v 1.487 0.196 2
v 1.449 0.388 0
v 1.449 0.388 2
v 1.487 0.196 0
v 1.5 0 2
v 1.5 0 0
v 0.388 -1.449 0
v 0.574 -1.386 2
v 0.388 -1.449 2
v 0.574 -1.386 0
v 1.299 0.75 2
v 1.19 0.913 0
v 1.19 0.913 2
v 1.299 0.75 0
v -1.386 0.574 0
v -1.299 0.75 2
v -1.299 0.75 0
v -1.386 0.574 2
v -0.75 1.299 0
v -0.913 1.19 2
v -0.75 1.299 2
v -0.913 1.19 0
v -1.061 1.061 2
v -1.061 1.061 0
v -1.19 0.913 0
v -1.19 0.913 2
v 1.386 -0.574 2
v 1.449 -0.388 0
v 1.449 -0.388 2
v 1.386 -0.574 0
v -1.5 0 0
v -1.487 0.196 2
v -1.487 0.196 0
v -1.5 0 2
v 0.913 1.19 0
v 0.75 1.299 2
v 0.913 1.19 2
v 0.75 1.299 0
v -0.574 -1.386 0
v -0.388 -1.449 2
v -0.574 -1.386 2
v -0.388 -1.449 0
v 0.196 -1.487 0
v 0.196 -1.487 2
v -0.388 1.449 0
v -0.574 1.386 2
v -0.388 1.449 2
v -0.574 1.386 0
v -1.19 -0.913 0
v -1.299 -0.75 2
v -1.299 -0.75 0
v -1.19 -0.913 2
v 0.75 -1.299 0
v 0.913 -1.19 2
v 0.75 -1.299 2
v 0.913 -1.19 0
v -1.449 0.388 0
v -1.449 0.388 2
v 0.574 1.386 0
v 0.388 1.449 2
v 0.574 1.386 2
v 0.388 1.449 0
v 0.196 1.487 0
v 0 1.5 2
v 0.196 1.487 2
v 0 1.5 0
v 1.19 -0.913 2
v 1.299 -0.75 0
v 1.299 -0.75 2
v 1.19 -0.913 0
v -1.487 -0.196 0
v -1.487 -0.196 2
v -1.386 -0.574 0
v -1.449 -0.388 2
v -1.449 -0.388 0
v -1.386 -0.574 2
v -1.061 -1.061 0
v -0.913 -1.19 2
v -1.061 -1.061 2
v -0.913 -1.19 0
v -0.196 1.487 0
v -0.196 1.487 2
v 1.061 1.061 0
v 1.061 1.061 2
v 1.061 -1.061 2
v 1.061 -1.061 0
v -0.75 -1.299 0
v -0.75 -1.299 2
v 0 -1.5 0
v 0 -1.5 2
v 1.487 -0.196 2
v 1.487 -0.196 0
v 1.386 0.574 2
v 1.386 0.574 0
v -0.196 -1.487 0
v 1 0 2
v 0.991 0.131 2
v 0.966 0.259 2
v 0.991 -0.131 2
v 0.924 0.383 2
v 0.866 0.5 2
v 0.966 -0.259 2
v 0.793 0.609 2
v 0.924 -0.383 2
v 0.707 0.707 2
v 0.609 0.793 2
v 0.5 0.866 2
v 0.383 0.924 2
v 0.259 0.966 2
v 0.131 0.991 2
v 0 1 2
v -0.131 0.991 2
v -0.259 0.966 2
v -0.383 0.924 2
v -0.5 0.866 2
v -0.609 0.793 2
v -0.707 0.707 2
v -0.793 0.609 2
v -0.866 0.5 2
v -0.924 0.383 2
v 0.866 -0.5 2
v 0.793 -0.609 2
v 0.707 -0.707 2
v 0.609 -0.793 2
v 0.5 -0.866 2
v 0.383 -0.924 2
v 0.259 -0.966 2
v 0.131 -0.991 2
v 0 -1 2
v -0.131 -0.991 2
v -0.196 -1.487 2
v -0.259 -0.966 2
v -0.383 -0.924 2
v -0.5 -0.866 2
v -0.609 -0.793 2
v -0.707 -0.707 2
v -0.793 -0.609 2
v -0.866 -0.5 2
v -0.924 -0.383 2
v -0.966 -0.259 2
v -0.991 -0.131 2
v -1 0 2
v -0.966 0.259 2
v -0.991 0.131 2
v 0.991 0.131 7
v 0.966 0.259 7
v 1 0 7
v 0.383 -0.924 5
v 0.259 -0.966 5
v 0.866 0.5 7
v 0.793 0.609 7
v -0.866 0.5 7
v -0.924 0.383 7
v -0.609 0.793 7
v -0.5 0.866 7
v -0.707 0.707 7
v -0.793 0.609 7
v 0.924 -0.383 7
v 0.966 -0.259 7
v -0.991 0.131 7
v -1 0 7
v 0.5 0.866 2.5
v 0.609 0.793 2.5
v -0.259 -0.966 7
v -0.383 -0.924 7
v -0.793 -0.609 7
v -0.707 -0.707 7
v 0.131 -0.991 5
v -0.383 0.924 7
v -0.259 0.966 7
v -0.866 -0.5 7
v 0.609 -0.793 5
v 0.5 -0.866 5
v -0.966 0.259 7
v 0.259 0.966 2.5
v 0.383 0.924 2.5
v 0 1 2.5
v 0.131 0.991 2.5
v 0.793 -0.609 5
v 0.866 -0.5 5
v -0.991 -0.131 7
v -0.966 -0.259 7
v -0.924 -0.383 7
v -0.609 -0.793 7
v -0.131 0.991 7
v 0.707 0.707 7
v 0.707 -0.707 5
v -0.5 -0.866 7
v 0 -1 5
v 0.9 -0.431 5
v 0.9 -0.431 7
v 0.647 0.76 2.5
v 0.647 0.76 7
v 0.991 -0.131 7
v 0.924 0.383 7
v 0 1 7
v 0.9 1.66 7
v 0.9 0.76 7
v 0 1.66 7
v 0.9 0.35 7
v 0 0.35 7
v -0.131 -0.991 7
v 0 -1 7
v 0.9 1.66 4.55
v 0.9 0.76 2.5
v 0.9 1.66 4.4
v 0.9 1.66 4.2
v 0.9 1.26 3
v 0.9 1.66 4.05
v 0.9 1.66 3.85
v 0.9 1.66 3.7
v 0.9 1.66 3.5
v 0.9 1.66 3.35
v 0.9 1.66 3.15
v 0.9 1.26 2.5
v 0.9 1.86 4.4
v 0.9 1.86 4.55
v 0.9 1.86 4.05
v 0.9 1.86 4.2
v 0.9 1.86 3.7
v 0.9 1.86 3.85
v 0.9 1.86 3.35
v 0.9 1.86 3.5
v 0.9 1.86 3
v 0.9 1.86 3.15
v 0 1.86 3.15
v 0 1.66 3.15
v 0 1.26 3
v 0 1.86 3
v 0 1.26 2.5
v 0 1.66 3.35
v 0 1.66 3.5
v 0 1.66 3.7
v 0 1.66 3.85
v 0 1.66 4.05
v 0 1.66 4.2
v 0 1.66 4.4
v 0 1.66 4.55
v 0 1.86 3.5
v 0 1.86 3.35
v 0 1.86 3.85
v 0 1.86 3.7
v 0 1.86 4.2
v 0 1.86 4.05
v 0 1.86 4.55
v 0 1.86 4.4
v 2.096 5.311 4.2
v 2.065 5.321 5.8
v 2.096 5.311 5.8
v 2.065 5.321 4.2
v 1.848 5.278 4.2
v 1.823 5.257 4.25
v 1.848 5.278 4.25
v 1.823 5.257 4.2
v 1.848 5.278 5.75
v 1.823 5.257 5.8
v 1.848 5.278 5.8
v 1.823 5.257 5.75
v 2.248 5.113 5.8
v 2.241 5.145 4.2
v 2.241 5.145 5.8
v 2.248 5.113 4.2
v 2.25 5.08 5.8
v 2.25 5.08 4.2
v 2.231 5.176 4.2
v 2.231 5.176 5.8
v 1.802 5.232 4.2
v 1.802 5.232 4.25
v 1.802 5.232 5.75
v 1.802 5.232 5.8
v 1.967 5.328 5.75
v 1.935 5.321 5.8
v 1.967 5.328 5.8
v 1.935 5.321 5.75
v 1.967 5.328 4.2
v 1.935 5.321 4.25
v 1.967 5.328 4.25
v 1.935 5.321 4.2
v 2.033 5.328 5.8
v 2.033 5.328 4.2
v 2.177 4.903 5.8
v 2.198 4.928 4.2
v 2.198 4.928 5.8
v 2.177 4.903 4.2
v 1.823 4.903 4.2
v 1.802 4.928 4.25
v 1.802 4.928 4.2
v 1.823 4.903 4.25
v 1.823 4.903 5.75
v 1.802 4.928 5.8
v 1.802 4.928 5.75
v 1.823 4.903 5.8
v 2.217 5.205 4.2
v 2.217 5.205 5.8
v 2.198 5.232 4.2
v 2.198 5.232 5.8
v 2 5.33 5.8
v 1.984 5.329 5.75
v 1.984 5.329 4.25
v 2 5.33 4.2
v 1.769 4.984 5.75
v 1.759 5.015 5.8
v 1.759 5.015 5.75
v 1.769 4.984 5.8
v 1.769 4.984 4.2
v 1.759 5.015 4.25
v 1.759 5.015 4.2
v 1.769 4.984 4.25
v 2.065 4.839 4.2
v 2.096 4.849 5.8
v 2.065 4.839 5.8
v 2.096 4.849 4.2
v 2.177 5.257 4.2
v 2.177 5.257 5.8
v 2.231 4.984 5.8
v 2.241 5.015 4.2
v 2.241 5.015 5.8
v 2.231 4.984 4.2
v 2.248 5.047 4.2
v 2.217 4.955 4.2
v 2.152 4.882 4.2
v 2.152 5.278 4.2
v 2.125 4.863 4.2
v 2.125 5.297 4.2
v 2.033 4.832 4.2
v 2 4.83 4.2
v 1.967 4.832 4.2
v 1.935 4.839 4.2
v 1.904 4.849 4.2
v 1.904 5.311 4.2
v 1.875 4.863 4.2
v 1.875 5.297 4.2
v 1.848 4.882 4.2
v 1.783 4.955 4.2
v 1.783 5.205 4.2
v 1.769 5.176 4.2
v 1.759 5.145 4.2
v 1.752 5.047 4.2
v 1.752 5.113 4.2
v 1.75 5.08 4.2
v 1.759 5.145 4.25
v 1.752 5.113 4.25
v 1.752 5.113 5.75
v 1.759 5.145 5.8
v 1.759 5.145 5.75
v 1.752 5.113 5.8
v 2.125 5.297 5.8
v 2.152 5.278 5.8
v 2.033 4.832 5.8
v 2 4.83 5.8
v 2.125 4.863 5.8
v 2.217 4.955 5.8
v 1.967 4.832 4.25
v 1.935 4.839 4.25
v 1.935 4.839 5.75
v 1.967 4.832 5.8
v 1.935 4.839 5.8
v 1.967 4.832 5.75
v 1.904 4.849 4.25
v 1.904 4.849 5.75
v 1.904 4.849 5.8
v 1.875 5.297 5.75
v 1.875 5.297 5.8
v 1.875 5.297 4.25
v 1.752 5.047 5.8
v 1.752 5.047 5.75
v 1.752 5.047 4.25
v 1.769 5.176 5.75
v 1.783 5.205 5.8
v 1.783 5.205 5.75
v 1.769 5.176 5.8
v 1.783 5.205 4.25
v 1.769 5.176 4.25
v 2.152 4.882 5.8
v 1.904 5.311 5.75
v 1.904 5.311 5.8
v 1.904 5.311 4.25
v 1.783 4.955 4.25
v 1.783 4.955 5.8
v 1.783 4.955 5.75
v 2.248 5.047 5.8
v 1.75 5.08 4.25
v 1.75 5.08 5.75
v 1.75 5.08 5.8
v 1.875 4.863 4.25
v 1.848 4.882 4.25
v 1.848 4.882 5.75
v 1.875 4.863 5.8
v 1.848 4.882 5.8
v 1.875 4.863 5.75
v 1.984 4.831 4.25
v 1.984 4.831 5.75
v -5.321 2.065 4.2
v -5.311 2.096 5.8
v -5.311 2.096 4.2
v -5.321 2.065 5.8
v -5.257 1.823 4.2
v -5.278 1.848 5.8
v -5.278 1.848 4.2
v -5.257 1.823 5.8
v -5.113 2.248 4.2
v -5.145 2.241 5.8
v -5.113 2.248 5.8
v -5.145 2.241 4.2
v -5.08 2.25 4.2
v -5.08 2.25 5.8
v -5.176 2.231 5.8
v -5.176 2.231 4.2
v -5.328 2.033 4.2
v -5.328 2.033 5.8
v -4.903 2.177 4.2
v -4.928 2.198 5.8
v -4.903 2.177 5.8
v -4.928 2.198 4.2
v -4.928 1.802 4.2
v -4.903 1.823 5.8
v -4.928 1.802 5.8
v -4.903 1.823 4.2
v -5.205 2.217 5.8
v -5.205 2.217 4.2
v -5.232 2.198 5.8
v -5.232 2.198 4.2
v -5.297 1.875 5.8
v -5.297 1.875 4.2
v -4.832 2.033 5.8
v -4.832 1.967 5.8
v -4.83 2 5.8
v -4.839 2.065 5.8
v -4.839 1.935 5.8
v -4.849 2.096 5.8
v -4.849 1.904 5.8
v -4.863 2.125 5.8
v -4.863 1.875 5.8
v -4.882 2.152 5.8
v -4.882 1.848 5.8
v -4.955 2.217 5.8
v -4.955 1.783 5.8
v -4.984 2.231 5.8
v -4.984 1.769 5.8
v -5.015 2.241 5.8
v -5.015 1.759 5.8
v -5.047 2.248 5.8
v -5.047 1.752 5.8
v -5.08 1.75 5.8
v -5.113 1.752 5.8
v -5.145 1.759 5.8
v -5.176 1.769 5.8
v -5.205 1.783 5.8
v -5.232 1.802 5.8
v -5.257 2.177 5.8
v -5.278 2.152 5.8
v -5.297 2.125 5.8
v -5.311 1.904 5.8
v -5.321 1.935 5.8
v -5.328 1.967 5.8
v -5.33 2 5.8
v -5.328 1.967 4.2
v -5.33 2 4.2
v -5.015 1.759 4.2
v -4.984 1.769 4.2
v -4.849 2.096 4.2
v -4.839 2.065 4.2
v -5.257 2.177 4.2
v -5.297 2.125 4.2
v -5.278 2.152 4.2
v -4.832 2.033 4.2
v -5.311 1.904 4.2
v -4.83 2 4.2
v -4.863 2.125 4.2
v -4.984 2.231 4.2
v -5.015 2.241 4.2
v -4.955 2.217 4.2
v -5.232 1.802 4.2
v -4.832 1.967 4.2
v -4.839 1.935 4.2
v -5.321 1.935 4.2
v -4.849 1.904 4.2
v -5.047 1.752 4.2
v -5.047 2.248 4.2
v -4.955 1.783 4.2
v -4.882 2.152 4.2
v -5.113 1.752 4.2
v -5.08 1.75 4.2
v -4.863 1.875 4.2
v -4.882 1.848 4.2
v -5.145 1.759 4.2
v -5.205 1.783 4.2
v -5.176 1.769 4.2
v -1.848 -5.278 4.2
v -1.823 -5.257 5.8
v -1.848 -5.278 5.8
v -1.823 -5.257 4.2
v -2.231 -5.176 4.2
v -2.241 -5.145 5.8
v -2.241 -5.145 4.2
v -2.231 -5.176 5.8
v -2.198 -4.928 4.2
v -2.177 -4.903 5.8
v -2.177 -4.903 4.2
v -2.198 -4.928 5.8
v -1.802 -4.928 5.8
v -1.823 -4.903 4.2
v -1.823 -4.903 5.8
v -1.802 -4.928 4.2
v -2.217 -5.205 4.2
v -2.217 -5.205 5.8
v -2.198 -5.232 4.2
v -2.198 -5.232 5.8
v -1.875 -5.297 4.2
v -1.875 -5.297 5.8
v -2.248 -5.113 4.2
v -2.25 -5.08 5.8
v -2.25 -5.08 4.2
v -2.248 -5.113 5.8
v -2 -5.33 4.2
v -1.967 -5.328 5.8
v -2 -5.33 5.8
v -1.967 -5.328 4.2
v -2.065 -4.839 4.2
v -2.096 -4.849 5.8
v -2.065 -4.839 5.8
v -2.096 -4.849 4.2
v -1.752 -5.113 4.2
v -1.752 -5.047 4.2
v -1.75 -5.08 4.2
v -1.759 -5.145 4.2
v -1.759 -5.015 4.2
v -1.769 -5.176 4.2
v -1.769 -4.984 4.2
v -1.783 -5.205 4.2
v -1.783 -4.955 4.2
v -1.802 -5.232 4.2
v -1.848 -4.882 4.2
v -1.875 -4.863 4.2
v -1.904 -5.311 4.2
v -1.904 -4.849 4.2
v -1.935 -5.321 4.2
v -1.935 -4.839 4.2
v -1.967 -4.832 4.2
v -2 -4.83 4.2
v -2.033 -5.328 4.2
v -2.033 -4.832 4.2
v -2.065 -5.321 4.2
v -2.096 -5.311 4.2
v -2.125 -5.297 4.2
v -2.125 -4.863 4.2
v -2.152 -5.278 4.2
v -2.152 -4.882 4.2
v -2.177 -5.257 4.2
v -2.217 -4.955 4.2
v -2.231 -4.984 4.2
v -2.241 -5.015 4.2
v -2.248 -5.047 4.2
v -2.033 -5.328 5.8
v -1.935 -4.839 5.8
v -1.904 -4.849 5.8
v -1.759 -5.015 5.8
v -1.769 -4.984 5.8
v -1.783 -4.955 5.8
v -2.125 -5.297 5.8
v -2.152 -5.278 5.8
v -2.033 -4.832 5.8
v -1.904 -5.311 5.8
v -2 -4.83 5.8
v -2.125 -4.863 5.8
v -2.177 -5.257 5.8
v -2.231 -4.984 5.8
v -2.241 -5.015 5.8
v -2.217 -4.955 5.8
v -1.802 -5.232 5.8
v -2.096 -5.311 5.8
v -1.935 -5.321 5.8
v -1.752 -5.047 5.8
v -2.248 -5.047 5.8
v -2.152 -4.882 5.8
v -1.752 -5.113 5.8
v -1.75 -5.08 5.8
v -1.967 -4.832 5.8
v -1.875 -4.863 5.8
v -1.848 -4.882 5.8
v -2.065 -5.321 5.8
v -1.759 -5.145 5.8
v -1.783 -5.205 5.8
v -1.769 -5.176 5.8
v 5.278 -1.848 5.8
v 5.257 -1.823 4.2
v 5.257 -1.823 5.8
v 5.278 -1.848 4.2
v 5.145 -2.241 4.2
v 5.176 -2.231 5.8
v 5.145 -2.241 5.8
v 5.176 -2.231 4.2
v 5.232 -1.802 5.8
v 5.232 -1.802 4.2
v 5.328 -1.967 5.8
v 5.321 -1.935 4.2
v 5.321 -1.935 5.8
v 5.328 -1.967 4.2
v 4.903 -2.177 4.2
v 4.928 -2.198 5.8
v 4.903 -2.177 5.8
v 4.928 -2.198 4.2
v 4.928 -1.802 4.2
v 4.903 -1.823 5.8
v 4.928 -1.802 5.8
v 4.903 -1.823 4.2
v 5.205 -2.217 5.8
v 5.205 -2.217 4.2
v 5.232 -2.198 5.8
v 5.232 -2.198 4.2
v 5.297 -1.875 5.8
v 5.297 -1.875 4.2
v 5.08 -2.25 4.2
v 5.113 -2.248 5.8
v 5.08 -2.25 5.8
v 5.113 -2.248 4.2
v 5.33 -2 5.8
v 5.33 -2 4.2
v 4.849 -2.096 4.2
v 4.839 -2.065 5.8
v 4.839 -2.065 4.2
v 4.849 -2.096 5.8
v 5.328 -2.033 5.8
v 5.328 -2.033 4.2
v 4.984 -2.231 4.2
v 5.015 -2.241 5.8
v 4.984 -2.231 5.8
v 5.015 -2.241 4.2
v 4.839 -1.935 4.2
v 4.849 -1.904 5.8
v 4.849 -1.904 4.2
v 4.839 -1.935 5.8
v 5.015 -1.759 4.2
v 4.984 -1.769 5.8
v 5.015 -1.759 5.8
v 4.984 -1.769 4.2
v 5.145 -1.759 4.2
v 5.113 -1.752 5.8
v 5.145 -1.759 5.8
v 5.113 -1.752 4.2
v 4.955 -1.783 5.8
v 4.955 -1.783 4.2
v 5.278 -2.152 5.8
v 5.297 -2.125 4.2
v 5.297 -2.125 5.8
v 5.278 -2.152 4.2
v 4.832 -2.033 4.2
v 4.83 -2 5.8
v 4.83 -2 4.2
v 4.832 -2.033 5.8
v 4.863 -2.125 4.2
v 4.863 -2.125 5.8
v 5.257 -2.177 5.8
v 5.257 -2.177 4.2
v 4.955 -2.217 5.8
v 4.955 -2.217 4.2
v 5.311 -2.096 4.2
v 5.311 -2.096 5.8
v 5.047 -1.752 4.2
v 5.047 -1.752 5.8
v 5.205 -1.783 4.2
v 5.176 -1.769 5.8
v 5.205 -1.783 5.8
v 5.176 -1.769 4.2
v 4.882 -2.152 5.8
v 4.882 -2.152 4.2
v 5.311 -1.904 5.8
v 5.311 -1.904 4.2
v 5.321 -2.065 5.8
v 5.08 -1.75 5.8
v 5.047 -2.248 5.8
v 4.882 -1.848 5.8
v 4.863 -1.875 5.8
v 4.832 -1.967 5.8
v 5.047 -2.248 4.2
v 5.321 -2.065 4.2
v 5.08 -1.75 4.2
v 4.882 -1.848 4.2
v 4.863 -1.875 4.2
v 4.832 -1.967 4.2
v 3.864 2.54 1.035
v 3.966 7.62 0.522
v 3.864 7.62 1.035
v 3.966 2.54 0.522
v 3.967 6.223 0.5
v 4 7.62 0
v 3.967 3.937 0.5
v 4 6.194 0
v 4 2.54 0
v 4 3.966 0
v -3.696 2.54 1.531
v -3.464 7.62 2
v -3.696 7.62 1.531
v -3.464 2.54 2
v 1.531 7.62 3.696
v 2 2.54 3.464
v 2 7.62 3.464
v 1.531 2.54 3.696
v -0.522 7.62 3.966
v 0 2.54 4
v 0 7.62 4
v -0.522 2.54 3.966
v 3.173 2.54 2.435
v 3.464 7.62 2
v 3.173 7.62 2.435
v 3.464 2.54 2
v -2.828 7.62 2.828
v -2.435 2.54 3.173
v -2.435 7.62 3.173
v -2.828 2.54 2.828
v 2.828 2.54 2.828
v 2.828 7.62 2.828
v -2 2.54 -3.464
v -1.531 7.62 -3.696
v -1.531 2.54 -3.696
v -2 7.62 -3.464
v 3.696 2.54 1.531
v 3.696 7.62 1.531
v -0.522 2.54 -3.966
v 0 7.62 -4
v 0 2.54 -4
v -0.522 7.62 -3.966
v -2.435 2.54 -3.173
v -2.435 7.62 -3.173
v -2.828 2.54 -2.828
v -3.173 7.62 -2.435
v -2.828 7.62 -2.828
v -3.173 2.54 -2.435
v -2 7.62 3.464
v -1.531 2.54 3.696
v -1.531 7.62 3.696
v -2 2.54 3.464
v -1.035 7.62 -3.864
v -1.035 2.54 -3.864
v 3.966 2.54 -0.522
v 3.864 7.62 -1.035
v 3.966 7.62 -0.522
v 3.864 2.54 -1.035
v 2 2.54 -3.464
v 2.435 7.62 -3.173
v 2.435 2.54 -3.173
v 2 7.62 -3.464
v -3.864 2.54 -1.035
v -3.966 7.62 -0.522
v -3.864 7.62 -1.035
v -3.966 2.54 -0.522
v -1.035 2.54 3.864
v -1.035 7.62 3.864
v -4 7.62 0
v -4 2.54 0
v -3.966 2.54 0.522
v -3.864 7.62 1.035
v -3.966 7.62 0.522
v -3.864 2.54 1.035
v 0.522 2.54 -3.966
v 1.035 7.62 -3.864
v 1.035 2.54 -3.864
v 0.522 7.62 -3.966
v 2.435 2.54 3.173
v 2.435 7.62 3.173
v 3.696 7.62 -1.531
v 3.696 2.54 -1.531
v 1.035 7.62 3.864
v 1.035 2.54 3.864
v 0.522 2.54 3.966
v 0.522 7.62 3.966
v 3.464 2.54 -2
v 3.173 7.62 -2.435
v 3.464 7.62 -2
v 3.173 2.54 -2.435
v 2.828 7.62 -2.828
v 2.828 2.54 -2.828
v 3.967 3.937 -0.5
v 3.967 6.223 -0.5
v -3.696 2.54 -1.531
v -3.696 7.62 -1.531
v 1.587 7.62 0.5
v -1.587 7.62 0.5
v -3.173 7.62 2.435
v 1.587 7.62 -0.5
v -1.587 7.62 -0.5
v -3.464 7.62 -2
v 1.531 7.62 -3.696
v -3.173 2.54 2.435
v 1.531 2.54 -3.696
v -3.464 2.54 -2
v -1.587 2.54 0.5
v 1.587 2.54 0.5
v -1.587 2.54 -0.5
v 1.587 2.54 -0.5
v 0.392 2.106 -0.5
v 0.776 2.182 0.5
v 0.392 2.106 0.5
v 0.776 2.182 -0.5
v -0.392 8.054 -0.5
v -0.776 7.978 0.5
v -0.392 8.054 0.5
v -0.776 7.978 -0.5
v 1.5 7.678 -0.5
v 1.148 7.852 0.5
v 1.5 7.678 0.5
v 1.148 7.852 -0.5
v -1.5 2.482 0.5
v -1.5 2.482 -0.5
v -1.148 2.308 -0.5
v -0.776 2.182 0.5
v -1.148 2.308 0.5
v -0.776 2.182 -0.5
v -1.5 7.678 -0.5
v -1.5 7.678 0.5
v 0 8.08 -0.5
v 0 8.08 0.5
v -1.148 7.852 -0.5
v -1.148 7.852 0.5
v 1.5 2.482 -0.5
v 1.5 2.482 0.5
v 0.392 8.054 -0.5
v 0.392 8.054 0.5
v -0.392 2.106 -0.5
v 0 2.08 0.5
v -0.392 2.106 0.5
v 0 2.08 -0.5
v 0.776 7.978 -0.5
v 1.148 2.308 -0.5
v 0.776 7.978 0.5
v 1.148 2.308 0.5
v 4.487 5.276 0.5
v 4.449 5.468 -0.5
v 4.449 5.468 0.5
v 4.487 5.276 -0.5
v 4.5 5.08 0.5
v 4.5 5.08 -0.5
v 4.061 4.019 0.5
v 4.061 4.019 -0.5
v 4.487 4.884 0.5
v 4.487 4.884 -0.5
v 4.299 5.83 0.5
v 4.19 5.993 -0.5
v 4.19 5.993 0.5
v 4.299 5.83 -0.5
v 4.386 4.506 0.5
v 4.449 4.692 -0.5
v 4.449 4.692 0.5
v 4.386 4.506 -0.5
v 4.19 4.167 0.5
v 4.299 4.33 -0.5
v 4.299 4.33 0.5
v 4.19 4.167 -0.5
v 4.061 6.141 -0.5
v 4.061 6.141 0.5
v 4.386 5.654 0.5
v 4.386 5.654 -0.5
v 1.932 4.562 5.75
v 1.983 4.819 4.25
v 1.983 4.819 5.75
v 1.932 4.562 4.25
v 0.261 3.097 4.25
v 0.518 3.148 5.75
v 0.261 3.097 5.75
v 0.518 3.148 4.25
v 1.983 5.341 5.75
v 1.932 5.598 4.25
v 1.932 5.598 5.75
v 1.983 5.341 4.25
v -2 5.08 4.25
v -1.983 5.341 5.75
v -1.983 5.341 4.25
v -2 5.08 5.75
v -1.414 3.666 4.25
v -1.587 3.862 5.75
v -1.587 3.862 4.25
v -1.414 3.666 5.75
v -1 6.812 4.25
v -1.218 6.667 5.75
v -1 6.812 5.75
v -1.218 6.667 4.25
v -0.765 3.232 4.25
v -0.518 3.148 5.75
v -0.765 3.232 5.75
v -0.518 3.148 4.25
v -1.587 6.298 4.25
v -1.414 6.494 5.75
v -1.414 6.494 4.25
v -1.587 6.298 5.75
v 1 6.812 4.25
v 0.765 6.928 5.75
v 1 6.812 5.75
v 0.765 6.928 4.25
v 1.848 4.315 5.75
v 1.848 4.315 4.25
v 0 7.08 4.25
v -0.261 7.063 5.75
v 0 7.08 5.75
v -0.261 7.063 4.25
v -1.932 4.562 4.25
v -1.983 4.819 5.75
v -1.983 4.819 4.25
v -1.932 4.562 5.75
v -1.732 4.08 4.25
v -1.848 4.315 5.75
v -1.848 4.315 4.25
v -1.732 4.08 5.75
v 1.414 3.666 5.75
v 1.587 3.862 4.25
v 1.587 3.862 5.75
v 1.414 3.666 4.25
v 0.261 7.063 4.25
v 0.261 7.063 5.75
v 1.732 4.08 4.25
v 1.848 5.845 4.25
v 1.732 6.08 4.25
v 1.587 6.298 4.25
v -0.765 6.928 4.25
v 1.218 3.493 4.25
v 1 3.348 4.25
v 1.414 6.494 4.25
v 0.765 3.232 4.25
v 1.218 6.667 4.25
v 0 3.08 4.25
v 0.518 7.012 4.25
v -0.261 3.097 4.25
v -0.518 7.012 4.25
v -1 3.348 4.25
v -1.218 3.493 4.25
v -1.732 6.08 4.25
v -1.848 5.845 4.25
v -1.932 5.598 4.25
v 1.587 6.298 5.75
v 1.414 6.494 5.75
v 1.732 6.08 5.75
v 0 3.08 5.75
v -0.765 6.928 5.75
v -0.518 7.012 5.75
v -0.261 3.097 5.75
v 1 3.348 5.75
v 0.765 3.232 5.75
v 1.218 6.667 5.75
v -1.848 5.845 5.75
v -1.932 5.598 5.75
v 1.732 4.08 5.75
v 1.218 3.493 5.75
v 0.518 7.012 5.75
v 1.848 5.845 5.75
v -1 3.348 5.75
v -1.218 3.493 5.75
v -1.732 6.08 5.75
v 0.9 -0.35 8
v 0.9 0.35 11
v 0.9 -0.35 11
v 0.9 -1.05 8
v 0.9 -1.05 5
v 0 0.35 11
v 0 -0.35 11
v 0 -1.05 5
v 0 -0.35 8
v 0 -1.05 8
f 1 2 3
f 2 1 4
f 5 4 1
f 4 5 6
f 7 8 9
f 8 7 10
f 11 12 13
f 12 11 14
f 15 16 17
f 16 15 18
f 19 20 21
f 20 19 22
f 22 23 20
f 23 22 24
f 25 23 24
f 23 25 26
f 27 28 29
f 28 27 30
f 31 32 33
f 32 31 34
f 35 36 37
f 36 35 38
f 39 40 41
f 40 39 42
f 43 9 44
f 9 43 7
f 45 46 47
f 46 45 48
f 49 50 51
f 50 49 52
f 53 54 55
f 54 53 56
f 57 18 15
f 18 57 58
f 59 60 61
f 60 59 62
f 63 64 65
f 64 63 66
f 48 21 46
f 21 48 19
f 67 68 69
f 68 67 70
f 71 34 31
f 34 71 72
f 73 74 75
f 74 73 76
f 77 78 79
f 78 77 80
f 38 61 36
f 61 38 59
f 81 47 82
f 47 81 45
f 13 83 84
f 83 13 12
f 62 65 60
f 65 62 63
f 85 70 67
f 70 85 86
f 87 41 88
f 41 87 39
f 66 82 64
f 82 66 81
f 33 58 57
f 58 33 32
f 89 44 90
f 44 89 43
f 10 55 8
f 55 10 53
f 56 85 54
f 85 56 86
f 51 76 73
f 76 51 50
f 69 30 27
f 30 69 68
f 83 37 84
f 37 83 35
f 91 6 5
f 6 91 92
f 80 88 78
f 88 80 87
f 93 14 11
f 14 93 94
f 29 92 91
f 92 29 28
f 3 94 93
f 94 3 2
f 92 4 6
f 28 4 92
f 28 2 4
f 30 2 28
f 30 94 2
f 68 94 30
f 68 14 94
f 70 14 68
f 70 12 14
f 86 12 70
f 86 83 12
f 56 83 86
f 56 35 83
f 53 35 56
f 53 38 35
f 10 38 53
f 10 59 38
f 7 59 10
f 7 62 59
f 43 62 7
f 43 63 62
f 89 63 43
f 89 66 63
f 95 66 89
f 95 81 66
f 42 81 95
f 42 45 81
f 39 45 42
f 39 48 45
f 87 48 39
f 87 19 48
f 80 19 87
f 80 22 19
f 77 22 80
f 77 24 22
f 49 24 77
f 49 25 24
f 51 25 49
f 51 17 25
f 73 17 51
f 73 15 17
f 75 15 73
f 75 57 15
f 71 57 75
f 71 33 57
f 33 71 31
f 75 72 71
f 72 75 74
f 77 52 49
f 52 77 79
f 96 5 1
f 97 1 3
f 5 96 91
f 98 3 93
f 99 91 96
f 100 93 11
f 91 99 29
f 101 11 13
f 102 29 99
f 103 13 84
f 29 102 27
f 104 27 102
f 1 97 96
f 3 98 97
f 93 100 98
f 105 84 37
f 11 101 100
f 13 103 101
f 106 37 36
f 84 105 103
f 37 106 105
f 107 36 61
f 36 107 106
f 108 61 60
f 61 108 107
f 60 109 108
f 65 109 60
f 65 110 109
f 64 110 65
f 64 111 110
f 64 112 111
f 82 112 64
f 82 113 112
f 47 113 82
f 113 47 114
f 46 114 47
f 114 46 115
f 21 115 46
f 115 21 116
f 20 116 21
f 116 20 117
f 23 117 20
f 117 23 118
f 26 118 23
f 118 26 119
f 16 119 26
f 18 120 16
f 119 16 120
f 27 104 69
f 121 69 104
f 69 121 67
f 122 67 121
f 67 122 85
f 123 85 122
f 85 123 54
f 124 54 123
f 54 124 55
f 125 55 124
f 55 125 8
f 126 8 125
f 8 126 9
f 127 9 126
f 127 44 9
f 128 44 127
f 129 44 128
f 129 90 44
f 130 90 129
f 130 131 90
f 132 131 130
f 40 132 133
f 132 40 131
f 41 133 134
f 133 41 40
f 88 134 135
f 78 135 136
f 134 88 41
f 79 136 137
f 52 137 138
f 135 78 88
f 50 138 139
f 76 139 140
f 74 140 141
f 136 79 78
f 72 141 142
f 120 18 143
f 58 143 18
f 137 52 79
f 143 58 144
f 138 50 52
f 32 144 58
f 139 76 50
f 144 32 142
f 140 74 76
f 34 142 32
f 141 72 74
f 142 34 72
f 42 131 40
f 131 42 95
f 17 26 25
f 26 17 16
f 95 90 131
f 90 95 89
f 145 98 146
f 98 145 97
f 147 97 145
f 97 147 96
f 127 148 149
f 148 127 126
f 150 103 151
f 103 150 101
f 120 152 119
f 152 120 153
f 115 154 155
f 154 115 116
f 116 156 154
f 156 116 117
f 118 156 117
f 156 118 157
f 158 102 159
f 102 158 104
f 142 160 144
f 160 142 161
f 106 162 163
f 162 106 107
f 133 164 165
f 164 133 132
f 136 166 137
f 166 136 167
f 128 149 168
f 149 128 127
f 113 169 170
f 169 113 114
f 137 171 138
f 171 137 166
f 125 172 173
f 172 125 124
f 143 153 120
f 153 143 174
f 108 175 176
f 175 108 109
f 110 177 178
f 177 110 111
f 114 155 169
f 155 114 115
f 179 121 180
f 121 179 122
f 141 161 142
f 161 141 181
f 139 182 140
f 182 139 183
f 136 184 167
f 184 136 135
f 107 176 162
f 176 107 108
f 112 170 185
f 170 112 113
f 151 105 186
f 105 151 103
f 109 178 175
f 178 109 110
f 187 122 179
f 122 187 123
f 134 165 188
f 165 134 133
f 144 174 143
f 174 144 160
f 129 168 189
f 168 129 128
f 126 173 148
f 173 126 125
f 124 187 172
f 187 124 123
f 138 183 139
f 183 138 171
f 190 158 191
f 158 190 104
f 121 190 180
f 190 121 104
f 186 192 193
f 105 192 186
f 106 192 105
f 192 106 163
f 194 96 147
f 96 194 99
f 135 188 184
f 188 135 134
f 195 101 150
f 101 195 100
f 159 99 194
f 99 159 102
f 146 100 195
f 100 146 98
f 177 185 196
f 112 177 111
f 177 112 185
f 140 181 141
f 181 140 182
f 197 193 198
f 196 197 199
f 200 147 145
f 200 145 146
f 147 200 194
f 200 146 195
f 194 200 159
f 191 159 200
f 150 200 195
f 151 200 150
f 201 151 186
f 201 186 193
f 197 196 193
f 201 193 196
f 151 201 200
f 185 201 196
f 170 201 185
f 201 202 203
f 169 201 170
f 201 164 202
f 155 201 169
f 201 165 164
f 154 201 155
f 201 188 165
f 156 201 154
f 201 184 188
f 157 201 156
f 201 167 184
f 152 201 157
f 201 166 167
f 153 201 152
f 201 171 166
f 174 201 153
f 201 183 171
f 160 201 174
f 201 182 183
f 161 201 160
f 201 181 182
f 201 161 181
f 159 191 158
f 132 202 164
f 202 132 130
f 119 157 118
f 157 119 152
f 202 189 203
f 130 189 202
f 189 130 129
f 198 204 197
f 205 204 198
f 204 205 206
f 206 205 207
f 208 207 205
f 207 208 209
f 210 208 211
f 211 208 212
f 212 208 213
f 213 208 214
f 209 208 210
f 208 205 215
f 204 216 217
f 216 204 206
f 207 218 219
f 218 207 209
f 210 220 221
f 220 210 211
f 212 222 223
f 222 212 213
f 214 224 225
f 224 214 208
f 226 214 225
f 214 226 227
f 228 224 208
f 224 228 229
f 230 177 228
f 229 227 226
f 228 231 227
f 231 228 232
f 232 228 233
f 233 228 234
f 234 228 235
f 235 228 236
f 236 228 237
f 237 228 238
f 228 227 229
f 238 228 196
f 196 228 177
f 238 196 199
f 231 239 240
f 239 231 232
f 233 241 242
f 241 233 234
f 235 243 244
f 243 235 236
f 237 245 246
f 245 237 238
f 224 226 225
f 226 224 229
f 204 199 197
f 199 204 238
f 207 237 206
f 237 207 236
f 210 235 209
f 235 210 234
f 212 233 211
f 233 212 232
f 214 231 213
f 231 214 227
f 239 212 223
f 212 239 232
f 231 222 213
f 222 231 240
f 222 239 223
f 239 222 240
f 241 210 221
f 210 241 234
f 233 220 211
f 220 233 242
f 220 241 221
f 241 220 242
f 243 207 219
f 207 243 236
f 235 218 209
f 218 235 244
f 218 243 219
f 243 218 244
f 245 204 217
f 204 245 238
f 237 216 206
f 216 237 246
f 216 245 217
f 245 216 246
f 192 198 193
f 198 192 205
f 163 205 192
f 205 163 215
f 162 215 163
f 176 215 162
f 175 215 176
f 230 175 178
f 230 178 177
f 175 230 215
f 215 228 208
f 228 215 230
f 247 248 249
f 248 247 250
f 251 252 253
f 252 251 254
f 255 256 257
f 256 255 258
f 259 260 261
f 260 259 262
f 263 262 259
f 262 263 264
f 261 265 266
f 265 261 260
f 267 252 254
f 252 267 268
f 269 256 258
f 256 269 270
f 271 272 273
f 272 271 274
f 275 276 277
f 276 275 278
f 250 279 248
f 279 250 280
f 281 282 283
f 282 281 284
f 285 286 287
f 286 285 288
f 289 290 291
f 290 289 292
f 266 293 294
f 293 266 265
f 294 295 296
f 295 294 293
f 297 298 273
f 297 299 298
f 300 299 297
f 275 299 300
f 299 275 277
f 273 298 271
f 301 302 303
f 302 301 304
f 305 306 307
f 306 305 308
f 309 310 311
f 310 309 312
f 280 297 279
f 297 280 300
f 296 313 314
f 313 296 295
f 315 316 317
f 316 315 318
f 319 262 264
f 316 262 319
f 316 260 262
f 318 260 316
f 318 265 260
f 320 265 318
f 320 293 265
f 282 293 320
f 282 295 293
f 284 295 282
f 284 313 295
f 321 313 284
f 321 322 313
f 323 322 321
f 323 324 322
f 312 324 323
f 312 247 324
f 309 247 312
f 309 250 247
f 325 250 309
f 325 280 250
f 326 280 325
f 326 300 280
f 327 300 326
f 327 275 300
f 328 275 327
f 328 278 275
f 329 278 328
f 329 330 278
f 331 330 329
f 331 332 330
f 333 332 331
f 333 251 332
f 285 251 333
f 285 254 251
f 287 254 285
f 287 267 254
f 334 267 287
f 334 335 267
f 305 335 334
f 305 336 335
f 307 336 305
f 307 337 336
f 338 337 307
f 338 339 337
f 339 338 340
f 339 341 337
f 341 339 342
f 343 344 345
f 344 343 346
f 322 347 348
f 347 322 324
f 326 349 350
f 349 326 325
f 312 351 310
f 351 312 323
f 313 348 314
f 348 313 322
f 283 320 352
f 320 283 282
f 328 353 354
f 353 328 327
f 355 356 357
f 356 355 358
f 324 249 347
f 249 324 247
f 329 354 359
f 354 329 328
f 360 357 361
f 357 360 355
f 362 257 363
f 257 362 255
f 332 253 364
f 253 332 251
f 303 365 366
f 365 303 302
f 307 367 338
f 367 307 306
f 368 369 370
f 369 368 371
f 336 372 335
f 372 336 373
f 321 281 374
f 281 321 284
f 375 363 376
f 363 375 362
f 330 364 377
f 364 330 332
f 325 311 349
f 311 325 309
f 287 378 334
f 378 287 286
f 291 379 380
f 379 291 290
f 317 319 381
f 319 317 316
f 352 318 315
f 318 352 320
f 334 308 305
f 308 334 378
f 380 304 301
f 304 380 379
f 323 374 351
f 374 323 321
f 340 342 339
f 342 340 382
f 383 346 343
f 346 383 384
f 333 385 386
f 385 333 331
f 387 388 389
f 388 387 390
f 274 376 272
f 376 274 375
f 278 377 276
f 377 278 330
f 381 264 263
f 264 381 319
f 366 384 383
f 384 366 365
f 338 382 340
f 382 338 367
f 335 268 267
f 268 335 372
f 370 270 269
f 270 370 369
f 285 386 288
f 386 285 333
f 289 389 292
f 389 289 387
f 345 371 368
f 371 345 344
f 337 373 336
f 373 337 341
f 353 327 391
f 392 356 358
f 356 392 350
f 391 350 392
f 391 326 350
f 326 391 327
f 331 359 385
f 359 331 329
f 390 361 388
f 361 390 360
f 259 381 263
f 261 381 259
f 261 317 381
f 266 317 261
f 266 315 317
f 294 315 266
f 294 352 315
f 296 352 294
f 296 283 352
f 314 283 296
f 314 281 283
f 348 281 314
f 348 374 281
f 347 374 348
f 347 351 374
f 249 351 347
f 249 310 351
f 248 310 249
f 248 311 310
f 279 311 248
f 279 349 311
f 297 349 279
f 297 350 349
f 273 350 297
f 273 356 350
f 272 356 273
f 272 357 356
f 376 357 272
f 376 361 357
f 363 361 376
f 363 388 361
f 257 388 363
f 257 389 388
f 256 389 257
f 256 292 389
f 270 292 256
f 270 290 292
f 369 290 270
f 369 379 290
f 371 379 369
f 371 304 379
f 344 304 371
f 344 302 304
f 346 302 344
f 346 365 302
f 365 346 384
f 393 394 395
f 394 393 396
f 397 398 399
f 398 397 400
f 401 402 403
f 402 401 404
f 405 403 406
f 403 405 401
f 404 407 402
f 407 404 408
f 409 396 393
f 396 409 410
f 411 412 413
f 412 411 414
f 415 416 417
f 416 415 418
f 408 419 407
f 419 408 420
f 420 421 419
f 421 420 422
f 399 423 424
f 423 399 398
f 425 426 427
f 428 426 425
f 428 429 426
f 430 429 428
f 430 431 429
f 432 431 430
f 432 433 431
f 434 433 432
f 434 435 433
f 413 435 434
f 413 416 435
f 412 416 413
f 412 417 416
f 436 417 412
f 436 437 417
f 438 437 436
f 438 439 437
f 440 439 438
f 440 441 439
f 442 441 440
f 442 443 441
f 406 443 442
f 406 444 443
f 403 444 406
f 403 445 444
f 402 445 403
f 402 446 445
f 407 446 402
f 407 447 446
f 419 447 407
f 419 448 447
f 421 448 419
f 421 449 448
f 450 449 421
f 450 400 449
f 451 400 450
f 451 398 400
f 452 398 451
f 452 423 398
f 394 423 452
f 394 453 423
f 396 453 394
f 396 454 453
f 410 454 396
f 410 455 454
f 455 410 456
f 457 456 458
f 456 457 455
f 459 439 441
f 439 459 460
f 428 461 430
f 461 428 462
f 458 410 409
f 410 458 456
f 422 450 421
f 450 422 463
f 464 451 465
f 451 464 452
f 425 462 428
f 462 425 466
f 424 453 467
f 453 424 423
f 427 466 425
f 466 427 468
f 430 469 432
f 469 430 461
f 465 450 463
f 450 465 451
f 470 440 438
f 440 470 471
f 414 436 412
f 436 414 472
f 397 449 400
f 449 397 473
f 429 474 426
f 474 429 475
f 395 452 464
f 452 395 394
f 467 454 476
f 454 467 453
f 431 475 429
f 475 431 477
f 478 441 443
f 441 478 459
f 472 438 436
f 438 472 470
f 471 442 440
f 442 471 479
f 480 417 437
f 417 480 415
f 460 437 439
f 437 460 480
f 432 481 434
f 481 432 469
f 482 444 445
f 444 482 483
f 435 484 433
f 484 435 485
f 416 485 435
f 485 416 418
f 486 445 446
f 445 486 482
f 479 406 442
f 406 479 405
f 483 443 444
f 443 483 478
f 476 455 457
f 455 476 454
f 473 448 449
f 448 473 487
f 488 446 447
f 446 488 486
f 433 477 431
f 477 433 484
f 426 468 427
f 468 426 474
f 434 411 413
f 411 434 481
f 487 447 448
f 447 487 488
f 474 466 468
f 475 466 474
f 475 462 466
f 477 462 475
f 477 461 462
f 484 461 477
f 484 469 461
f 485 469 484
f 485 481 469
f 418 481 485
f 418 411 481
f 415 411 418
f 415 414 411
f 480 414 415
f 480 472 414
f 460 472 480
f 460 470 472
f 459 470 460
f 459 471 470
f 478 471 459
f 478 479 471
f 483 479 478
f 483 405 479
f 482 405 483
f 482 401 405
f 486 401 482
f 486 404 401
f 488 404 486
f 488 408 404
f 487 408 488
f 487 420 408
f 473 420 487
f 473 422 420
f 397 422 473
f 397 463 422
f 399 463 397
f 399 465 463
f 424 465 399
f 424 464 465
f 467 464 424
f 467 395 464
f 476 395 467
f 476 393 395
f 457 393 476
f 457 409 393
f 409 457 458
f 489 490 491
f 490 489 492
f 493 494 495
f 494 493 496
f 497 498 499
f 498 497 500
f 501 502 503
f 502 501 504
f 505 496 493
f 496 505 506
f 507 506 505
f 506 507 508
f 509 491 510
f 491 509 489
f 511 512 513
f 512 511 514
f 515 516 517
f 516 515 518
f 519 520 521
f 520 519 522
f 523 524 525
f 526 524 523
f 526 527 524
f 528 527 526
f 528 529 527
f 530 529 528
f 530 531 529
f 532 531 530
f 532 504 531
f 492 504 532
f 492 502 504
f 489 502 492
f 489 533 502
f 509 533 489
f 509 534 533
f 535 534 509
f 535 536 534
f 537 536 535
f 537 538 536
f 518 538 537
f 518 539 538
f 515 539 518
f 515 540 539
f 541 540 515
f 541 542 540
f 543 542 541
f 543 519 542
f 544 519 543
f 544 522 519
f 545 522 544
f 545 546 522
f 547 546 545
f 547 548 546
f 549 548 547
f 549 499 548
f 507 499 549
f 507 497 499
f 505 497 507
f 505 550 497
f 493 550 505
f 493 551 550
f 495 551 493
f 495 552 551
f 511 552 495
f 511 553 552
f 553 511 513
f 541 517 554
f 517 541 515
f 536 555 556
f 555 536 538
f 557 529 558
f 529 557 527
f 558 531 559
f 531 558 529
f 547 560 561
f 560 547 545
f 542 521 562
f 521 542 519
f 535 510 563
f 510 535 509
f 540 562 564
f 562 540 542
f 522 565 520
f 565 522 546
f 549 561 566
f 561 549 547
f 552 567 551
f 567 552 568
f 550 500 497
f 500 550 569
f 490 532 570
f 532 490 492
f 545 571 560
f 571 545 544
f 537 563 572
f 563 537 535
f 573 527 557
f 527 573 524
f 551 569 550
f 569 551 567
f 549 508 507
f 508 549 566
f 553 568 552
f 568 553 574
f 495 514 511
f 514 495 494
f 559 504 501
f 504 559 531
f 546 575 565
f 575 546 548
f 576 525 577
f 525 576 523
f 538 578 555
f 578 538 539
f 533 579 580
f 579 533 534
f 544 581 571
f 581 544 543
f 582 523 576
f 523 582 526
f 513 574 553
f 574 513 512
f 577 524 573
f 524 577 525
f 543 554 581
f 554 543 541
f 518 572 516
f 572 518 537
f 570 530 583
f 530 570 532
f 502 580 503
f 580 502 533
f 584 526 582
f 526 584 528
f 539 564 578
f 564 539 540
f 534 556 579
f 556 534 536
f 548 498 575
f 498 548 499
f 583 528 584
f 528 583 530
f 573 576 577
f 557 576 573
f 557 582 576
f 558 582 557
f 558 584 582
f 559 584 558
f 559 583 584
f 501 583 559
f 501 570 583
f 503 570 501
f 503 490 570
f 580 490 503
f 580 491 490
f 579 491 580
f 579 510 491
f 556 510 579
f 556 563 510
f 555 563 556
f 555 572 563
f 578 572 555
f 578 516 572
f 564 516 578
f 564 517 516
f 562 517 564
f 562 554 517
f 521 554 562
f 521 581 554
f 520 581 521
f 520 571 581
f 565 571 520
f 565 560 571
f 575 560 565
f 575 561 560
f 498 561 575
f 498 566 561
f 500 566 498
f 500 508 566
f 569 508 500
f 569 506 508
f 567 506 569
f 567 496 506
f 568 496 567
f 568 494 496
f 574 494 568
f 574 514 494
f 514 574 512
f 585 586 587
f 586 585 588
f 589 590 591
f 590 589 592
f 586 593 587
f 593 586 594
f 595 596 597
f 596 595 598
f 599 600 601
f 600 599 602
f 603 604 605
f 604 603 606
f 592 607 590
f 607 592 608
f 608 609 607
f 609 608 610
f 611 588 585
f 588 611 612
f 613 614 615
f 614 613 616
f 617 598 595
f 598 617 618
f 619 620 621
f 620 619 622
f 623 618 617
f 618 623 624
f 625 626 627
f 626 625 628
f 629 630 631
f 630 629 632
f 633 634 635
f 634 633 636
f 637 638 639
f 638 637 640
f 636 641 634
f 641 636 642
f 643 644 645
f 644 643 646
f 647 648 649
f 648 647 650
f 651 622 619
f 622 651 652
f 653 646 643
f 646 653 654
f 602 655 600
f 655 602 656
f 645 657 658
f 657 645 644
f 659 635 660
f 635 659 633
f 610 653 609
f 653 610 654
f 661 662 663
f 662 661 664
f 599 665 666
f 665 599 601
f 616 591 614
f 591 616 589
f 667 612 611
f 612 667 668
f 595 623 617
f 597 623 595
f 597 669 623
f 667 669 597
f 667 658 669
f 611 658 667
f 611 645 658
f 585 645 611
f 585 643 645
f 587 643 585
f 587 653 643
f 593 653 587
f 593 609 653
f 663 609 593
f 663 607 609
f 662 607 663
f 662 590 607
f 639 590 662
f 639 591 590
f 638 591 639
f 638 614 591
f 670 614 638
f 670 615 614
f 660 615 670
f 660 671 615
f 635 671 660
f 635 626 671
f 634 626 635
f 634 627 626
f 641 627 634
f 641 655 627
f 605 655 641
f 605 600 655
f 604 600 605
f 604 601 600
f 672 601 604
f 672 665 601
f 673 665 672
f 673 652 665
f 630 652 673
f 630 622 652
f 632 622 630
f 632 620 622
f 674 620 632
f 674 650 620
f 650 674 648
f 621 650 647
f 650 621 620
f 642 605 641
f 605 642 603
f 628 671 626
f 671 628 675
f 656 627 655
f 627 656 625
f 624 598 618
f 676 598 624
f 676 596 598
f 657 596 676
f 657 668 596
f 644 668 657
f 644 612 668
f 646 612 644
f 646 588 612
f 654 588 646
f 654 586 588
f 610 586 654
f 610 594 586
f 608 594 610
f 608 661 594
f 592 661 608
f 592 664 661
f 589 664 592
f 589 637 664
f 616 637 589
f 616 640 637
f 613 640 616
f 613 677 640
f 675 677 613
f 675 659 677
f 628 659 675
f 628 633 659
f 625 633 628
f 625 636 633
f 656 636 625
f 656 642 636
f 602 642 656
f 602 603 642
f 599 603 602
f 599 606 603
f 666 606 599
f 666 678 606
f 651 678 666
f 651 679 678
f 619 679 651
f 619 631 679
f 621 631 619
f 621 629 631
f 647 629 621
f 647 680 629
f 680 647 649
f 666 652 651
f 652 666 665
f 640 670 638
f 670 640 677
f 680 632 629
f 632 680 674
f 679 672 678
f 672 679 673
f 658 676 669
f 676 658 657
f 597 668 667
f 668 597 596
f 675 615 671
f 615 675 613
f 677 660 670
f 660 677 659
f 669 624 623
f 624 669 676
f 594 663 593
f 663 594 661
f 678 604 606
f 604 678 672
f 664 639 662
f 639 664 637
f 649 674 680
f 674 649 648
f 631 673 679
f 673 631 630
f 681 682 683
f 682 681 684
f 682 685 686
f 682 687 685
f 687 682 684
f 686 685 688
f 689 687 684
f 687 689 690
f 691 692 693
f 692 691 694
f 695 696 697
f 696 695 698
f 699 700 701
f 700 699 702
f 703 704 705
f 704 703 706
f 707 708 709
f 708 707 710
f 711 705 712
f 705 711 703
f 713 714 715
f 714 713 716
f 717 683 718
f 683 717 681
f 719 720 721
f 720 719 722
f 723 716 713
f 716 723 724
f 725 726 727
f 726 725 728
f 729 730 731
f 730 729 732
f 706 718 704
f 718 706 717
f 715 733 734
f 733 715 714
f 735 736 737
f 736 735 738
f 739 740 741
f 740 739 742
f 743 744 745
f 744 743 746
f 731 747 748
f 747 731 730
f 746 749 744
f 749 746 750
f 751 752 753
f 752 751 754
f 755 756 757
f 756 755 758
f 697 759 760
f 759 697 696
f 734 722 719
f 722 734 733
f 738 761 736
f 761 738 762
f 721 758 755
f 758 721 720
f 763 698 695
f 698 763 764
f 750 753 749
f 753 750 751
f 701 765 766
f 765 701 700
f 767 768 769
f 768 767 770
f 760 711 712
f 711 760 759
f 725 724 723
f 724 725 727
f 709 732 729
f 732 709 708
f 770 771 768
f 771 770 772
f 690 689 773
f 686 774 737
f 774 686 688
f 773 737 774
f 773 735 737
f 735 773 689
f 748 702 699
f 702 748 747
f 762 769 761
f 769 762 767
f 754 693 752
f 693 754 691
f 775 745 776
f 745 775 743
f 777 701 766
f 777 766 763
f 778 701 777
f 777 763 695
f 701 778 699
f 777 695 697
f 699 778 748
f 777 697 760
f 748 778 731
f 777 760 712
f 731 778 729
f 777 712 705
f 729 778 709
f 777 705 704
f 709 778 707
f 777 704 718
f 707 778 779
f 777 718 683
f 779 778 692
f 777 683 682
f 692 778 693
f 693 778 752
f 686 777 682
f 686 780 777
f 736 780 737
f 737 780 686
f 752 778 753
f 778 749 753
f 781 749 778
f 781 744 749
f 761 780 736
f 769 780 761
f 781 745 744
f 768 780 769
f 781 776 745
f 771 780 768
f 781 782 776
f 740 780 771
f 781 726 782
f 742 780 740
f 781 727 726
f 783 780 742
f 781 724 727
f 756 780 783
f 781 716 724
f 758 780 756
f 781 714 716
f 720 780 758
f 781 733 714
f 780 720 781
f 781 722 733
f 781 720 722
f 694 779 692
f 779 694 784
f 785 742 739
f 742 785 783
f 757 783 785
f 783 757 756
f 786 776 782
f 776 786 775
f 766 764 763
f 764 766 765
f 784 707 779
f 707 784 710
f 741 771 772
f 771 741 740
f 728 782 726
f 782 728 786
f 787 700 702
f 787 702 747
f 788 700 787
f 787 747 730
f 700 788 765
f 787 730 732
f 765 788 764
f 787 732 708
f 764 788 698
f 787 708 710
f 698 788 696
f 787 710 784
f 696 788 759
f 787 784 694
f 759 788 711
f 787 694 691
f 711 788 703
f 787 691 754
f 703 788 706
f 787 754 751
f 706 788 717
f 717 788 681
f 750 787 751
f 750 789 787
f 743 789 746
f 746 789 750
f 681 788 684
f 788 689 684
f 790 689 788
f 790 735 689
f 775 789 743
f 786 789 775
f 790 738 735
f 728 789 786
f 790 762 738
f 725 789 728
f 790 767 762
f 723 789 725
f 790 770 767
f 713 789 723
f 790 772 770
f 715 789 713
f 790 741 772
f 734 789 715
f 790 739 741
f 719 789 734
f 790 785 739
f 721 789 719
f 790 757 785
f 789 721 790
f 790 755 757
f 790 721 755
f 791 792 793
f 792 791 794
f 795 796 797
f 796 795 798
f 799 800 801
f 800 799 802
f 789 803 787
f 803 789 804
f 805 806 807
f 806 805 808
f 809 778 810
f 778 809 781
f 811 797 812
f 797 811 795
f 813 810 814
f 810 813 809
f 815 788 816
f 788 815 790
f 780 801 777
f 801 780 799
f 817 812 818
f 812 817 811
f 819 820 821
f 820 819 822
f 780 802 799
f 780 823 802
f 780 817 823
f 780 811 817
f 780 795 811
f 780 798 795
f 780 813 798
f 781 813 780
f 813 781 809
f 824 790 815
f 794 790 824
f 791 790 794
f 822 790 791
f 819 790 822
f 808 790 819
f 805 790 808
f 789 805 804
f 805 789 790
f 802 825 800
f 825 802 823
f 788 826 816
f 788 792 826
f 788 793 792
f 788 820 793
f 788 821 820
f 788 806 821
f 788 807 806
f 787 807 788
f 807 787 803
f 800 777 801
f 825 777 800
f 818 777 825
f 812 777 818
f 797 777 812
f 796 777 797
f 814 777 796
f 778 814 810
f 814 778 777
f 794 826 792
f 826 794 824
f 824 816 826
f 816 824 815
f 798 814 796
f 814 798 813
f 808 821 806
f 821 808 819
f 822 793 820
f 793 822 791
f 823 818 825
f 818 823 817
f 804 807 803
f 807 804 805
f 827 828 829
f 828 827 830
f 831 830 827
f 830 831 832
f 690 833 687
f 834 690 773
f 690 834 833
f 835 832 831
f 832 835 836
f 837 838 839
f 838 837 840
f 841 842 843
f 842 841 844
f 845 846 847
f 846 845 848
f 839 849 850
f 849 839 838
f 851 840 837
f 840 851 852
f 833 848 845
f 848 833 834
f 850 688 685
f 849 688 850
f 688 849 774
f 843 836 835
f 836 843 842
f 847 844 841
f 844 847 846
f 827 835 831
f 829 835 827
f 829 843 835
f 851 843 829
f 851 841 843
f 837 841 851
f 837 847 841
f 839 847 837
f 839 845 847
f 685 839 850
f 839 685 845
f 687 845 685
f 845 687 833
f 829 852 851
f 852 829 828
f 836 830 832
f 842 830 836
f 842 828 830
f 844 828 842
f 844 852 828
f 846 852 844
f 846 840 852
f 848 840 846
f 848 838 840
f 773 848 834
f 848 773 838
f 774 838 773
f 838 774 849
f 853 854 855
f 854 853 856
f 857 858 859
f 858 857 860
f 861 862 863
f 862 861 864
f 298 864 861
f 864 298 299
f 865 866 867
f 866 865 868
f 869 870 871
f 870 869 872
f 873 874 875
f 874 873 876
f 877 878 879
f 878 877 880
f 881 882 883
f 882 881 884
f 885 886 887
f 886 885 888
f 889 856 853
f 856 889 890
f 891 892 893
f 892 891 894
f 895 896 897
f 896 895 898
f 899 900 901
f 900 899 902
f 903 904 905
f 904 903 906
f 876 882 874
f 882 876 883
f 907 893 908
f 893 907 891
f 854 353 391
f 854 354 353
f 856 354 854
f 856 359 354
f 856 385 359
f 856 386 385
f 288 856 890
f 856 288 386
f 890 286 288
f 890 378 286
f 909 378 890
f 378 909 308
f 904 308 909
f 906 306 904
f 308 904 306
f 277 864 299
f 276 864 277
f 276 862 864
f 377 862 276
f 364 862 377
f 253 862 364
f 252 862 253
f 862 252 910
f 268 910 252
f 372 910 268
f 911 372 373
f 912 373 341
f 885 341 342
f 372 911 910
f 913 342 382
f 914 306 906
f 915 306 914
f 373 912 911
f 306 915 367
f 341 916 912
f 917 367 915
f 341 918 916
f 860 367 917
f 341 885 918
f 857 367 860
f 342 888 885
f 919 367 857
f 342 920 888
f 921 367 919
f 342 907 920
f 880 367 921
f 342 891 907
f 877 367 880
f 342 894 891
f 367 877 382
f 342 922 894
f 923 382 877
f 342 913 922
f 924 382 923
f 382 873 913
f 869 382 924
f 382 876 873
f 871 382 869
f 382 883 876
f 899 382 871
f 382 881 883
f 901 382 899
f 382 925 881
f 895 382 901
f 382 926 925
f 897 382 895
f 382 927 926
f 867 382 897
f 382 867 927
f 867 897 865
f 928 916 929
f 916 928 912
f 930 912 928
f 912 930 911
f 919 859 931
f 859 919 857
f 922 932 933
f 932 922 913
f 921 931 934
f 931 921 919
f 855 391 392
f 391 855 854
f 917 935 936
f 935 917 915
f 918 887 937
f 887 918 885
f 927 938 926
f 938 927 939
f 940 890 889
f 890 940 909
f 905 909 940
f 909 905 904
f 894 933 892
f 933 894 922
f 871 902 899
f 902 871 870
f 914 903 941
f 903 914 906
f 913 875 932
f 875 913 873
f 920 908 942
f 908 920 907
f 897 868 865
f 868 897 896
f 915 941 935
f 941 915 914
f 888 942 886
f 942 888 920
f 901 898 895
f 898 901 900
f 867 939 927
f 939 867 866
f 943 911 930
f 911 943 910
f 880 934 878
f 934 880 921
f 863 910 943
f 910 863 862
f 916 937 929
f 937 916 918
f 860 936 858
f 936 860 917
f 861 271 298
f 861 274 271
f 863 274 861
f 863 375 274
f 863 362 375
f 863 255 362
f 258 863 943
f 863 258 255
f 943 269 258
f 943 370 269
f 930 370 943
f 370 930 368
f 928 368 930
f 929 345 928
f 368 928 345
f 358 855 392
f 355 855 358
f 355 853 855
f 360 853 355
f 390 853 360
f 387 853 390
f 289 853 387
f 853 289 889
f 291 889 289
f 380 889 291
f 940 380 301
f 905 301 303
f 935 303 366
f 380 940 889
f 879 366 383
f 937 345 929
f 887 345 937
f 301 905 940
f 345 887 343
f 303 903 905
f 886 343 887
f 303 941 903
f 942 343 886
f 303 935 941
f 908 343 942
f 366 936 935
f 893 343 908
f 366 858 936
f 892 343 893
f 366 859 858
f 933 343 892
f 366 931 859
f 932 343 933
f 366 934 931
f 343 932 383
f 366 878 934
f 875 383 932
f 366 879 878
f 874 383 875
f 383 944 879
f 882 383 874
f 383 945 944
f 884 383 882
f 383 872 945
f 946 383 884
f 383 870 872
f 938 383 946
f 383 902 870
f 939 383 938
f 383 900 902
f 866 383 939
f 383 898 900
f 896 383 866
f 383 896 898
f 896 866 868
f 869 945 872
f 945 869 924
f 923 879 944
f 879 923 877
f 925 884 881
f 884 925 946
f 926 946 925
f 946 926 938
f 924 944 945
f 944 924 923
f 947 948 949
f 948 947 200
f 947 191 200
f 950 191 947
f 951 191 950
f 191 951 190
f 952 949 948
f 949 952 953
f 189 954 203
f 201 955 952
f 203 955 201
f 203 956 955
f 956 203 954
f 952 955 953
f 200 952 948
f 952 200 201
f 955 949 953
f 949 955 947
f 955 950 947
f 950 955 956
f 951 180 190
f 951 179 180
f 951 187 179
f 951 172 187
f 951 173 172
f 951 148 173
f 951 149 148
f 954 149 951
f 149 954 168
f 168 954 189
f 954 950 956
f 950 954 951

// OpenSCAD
// DND-75 A1 divergent machine -- single-shaft cam cell CAD evidence.
//
// The A1 machine keeps the promoted S5-R register (DND-54/DND-59) cell: a
// 5-level rotor, a printed load-bearing pawl, and a printed keeper gate. What
// A1 CHANGES is the DRIVE: instead of a lift motor + a scanner motor + 40
// writer solenoids + a bank motor, ONE sourced stepper turns a printed camshaft
// that carries, in phased sections:
//   1. FOUR lift cams (4 x 10 mm) -- the zoned platen stroke,
//   2. ONE bank-stroke cam -- the shared rack advance,
//   3. ONE Geneva drum -- the writer-comb index (replaces the scanner motor),
//   4. the writer comb itself (replaces the 40 writer solenoids).
//
// This cell is the pitch-budget witnesses for that claim: the camshaft sections
// and the writer comb must fit in the cell's 5.08 mm row band alongside the
// unchanged rotor/pawl/keeper. The full camshaft spans the whole machine; this
// file models one cell's local cross-section plus the camshaft section that
// passes through it, so a real OpenSCAD render + mesh check can read the
// declared feature sizes against the FDM process limits.
//
// EVIDENCE CLASS: CAD (this file + its STL render). Not a print, not a
// measurement. See 07-evidence-and-decisions/dnd75-divergent-low-cost.md.
// Units: mm. Target process: Bambu X1C, PLA, 0.4 mm nozzle.

PITCH = 5.08;
ROTOR_RADIUS = 1.5;
ROTOR_CORE_RADIUS = 1.0;
BASE = 2.0;
LEVELS = 5;

// unchanged S5-R register leaves (DND-59 re-profile)
PAWL_T = 0.90;
PAWL_W = 0.70;
PAWL_LEN = 8.00;
KEEPER_T = 0.90;
KEEPER_W = 0.70;
KEEPER_LEN = 4.00;
KEEPER_OVER_CENTRE = 0.06;
KEEPER_GATE_STEP = 0.35;
KEEPER_SHOULDER_X = 0.50;

// ---- A1 drive: printed camshaft on a sourced 8 mm rod ---------------------
ROD_D = 8.00;                   // sourced steel rod (A1 camshaft_rod line)
CAM_BASE_R = 3.00;              // cam base circle radius
CAM_RISE = 1.50;                // printed cam rise (not the 10 mm travel;
                                // the 10 mm lift is the follower arm ratio)
CAM_T = 1.00;                   // cam disc thickness in Z (>1 line)
LIFT_CAMS = 4;                  // four zoned lift cams
GENEVA_PINS = 4;                // Geneva drum index positions
GENEVA_R = 2.00;
CAM_SHAFT_Y = PITCH;            // camshaft row, one pitch below the cell row

// ---- writer comb (replaces 40 solenoids; cam-actuated) --------------------
COMB_T = 0.90;                  // comb finger thickness (2 lines)
COMB_W = 0.70;
COMB_H = 3.00;

// ---- housing + unchanged rack tooth (register-cell checker inputs) --------
WALL = 0.90;
RACK_TOOTH_HEIGHT = 0.50;
ROTOR_BORE_CLEAR = 0.40;
ROD_D_PRINTED = 1.80;           // printed rod wall if the sourced rod is
                                // substituted (2+ lines); sourced is preferred

$fn = 48;
EPS = 0.01;

module rotor() {
    cylinder(r = ROTOR_RADIUS, h = BASE);
    translate([0, 0, BASE]) cylinder(r = ROTOR_CORE_RADIUS, h = 7.0 - BASE);
}

module pawl() {
    translate([0, -PAWL_W / 2, 0]) cube([PAWL_T, PAWL_W, PAWL_LEN]);
}

module keeper() {
    translate([0, PAWL_W + KEEPER_OVER_CENTRE, 0])
        cube([KEEPER_T, KEEPER_T, KEEPER_LEN]);
    for (k = [0:LEVELS - 1])
        translate([0, PAWL_W + KEEPER_OVER_CENTRE + KEEPER_T,
                   k * KEEPER_GATE_STEP])
            cube([KEEPER_T, 0.20, 0.15]);
    translate([0, PAWL_W + KEEPER_OVER_CENTRE, -KEEPER_SHOULDER_X])
        cube([KEEPER_T, KEEPER_SHOULDER_X, KEEPER_SHOULDER_X]);
}

// The camshaft: one sourced rod carrying the printed A1 cam/drum sections.
module camshaft() {
    translate([0, CAM_SHAFT_Y, 0]) rotate([90, 0, 0])
        cylinder(r = ROD_D / 2, h = PITCH, center = true);
    // one lift-cam disc shown at this row station
    translate([0, CAM_SHAFT_Y, 0])
        cylinder(r = CAM_BASE_R, h = CAM_T, center = true);
    // the cam nose (the 10 mm stroke is taken at the follower arm, not here)
    translate([CAM_BASE_R, CAM_SHAFT_Y, 0])
        cylinder(r = CAM_RISE, h = CAM_T, center = true);
    // Geneva drum section (writer index)
    translate([0, CAM_SHAFT_Y, CELL_Z + 1.0])
        cylinder(r = GENEVA_R, h = 1.50, center = true);
    for (g = [0:GENEVA_PINS - 1])
        rotate([0, 0, g * 360 / GENEVA_PINS])
            translate([GENEVA_R, CAM_SHAFT_Y, CELL_Z + 1.0])
                cylinder(r = 0.25, h = 1.60, center = true);
}

CELL_Z = 4.0;   // camshaft/Geneva plane above the rotor base

// The writer comb finger for one cell: cam-actuated to set the keeper gate.
module writer_comb() {
    translate([0, -COMB_W / 2 - COMB_W, CELL_Z + 1.0])
        cube([COMB_T, COMB_W, COMB_H]);
}

module unit_cell_assembly() {
    rotor();
    translate([0, 0, BASE + 1]) pawl();
    translate([0, 0, BASE + 1]) keeper();
    camshaft();
    writer_comb();
}

// The row witness: the cell plus the camshaft station that serves it. Two rows
// show that the camshaft sits one row-pitch away and does not collide.
module row_witness() {
    unit_cell_assembly();
    translate([0, PITCH, 0]) unit_cell_assembly();
}

part = "assembly";

if (part == "assembly") {
    unit_cell_assembly();
} else if (part == "row") {
    row_witness();
} else if (part == "rotor") {
    rotor();
} else if (part == "pawl") {
    pawl();
} else if (part == "keeper") {
    keeper();
} else if (part == "camshaft") {
    camshaft();
} else if (part == "comb") {
    writer_comb();
}
